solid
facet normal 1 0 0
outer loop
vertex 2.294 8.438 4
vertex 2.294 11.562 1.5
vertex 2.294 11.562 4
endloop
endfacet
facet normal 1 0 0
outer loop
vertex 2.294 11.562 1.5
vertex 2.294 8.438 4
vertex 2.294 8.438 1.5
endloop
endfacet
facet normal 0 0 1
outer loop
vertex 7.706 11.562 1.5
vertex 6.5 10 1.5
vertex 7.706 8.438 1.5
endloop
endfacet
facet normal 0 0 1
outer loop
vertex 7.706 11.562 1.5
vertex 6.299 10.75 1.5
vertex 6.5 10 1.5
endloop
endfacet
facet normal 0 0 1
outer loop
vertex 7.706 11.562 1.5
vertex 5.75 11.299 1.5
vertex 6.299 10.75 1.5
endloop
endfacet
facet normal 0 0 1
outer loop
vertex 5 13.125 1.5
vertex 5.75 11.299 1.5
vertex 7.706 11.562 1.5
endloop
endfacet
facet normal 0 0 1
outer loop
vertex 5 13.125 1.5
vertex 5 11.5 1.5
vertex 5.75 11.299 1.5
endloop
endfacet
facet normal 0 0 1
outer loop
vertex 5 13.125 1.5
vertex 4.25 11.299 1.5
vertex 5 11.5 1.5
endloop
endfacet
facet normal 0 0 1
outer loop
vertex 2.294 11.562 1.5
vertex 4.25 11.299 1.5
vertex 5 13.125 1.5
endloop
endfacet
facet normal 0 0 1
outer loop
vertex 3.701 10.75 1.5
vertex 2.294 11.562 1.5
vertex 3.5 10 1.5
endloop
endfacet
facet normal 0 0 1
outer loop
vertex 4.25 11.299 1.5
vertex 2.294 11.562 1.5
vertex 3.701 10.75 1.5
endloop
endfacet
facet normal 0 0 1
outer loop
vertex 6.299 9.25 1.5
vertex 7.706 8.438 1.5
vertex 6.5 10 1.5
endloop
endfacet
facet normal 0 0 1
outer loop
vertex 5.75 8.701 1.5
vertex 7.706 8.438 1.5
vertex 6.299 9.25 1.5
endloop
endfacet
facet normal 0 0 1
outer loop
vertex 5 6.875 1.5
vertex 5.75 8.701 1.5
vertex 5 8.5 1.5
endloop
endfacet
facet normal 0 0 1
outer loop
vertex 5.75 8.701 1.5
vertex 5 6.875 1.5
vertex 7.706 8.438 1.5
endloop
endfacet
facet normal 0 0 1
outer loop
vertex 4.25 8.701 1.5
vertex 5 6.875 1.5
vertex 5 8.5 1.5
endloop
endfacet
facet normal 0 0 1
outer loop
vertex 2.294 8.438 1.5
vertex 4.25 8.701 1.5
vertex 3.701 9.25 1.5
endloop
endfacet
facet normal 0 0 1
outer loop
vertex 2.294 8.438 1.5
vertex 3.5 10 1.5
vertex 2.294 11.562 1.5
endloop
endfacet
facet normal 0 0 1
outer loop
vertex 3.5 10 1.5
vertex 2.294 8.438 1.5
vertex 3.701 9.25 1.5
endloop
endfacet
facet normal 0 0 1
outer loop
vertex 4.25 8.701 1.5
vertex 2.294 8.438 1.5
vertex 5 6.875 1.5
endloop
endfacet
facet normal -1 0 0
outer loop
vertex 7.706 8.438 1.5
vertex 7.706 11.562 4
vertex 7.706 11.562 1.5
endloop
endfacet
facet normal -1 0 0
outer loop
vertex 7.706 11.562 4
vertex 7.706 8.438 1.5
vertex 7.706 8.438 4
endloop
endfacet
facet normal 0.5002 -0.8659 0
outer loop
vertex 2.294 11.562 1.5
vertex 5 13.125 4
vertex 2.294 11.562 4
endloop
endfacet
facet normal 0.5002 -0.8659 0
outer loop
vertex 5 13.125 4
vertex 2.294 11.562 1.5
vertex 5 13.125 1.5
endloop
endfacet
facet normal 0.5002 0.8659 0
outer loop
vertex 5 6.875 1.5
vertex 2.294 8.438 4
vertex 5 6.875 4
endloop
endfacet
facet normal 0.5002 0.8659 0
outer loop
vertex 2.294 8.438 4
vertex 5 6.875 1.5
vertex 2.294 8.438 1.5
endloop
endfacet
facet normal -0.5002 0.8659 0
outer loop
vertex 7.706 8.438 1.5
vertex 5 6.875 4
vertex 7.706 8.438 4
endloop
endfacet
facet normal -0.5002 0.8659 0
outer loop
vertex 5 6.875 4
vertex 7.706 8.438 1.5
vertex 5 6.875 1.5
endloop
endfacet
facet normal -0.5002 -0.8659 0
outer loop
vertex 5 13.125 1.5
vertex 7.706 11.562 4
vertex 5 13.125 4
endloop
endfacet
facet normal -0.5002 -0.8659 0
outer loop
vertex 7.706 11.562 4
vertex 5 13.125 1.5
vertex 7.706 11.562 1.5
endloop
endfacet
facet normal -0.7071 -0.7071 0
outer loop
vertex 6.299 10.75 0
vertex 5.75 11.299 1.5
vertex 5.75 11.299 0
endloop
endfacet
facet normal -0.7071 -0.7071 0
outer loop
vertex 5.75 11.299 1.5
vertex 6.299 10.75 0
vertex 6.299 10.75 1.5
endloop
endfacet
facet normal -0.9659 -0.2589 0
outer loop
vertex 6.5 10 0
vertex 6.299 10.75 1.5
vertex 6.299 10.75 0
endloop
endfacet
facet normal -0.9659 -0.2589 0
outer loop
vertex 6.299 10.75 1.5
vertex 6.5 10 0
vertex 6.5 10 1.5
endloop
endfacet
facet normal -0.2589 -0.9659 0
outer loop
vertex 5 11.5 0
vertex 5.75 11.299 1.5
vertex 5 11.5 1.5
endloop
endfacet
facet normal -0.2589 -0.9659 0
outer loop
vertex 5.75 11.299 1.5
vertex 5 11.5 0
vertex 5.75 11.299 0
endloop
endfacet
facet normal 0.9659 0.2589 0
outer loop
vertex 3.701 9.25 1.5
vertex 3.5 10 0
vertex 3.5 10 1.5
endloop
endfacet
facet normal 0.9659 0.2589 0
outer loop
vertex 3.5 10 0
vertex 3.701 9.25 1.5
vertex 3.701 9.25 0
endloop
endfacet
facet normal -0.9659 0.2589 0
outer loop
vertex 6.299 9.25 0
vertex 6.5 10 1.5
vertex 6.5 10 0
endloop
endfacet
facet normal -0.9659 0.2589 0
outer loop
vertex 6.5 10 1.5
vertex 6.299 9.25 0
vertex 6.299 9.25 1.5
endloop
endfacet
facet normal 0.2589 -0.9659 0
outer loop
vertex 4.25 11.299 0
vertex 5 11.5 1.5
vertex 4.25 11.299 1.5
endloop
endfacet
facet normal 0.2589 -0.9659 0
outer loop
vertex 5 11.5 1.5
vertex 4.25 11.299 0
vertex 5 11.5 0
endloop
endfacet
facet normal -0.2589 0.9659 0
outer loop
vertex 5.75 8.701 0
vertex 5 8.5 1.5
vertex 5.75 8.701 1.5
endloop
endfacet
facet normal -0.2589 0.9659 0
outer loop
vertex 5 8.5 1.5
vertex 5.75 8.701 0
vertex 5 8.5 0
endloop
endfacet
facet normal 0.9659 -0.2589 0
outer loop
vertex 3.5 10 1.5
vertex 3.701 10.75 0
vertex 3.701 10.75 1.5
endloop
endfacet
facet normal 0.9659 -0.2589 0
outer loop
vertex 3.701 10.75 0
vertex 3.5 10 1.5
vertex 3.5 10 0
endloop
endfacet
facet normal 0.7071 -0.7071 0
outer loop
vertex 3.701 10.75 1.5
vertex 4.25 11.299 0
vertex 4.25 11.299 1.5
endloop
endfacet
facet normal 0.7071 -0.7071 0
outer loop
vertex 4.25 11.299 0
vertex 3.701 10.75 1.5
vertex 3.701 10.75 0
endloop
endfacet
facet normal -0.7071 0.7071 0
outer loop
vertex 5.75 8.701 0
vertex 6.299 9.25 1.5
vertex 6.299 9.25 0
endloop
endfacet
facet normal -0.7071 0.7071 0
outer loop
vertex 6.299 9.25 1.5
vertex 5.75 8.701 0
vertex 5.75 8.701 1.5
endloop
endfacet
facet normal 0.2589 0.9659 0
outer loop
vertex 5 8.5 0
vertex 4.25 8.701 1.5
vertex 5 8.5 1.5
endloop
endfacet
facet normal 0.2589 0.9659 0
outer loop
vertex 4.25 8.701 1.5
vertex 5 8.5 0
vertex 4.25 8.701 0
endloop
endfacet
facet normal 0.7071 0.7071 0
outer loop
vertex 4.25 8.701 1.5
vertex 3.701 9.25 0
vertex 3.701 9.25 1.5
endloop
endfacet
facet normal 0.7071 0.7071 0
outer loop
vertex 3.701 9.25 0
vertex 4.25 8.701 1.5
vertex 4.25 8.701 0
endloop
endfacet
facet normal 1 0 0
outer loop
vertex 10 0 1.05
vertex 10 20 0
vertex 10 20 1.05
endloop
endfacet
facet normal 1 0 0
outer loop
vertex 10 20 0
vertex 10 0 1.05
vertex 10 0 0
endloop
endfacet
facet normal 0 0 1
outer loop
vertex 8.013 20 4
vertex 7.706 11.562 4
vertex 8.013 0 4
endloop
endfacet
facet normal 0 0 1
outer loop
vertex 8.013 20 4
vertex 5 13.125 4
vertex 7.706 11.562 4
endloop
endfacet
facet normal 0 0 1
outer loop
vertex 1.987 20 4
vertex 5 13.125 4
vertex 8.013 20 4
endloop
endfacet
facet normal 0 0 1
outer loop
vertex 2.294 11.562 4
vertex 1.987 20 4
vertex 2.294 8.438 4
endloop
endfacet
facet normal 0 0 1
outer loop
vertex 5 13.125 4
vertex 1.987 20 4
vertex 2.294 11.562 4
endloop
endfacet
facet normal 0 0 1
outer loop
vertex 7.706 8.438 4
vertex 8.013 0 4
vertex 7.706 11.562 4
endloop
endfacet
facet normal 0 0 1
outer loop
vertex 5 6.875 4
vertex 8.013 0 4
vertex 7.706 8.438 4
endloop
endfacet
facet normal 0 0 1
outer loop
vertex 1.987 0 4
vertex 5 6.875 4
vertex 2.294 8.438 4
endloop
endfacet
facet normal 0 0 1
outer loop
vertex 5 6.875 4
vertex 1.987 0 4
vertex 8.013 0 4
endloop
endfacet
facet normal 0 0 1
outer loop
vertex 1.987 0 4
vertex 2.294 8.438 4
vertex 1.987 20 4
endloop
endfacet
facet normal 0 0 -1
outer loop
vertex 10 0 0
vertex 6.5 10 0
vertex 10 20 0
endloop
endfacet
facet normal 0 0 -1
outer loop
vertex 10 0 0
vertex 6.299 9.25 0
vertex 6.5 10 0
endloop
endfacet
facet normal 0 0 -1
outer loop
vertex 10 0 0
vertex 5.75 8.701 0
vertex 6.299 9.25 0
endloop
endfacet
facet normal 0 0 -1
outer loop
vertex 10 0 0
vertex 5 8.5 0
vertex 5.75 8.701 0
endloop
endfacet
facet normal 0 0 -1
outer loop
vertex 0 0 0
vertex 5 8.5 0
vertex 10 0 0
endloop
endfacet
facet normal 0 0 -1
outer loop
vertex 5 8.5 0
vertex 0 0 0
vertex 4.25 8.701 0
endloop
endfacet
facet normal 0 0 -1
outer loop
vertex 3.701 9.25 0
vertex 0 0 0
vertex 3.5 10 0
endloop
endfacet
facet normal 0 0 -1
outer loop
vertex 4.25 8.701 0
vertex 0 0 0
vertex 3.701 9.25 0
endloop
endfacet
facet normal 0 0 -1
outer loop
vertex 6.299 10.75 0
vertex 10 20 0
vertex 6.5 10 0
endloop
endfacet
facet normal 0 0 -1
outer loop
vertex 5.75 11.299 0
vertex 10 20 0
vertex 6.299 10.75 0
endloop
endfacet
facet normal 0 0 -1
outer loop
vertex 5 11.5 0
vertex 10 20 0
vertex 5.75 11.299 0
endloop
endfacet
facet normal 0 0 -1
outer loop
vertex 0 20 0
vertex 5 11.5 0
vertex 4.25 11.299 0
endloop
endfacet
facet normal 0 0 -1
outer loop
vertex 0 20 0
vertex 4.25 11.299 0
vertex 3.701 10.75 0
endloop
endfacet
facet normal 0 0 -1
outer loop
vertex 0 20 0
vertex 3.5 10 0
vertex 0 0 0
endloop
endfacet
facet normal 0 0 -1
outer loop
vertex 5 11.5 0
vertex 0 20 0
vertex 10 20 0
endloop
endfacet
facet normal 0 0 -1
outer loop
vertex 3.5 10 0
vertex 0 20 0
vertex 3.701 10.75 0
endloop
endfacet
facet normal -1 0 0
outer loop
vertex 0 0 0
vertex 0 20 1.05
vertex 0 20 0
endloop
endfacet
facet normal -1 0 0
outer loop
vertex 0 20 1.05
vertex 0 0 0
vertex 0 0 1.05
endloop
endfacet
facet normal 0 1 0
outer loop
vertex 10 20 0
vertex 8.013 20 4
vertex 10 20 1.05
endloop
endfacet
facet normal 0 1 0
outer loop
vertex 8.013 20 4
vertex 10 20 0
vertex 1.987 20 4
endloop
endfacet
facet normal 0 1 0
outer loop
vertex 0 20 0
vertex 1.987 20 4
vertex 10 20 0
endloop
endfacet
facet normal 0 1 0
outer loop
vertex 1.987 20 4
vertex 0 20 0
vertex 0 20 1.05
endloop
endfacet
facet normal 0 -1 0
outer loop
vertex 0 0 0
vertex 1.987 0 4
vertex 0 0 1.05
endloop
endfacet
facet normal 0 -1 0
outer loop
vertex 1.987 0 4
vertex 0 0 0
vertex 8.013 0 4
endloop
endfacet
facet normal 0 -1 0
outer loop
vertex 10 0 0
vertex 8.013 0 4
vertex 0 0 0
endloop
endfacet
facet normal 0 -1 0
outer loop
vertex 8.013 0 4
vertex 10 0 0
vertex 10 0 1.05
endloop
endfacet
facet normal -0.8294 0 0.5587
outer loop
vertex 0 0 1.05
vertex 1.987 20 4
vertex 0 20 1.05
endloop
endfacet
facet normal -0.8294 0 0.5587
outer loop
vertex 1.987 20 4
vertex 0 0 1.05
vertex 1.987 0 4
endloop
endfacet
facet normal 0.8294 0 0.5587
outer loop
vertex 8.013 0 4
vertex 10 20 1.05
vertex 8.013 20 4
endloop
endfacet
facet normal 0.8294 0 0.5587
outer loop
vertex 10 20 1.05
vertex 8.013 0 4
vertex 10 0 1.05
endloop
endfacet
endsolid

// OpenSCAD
// Customizer Parameters

// Create a T-nut for v-slot style extrusions. Defaults for 2020 extrusion with M3 hole.
//
// Arguments:
// length of tnut
length=20;

// how many holes to put in it
holes=1;

// diameter of holes
holesize=3;

// distance between hole centers (which are always centered on the nut)
spacing=10;

// depth of nut sink
sink=2.5;

// height of tnut (use 4mm for 2020 extrusion)
height=4;

// width of tnut (use 10mm for 2020 extrusion)
width=10;

// inset distance of bezel (use 3mm for 2020 extrusion)
bezel=2;

// depth of base (negative from z=0); use for slide-on attachments to other parts)
base=0;

// nut parameters
// how many sides on the nut (hex=6)
nutsides=6;
// nutsize = point-to-point size of nut
nutsize=6.25;
// amount to rotate (to fit inside body)
nutrotation=30;

// circle optimization
$fn=12;

// include <mygeom.scad>
module rotate_axis(axis, d) {
    rotate(list_for_axis(axis, d)) children();
}

module xrotate(d) {
    rotate_axis("x", d) children();
}

module yrotate(d) {
    rotate_axis("y", d) children();
}

module zrotate(d) {
    rotate_axis("z", d) children();
}

function list_for_axis(axis, d) =
(
    axis=="x" ? [d, 0, 0] : (
        axis=="y" ? [0, d, 0] : (
            axis=="z" ? [0, 0, d] : [0, 0, 0]))
);

module translate_axis(axis, d) {
    translate(list_for_axis(axis, d)) children();
}

module xmove(d) {
    translate_axis("x", d) children();
}

module ymove(d) {
    translate_axis("y", d) children();
}

module zmove(d) {
    translate_axis("z", d) children();
}

module spread_axis(axis, d, n=1) {
    x = d/2;
    if(d==0 || n==0) {
        children();
    }
    else
    {
        for(i=[-x:(d/n):x]) {
            translate_axis(axis, i) children();
        }
    } 
}

module xspread(d, n=1)
{
    spread_axis("x", d, n) children();
}

module yspread(d, n=1)
{
    spread_axis("y", d, n) children();
}


module zspread(d, n=1)
{
    spread_axis("z", d, n) children();
}

module star(points, id, od)
{
    polygon([
        for(i=[0:points*2])
            [
            (i%2==0) ? cos(i*(360/(points*2)))*od/2 : cos(i*(360/(points*2)))*id/2,
            (i%2==0) ? sin(i*(360/(points*2)))*od/2 : sin(i*(360/(points*2)))*id/2
            ]
    ]);
}

module unit_star(points, height, id, od, center=true)
{
    linear_extrude(height, center=center) star(points, id, od);
}

module unit_polygon(r, n)
{
    polygon([
        for(i=[0:360/n:360])
            [ cos(i)*r, sin(i)*r ]
    ]);
}


module screw_hole(size, depth, sinkwidth=5, sinkdepth=0, type="round", center=true) {
    zmove(center ? 0 : depth/2) {
        cylinder(h=depth, d=size, $fn=12, center=true);
        ref=sinkdepth/abs(sinkdepth) * depth/2;
        zmove(ref-sinkdepth/2) {
            if(type=="round") cylinder(h=abs(sinkdepth), d=sinkwidth, $fn=12, center=true);
            if(type=="hex") linear_extrude(height=abs(sinkdepth), center=true) rotate([0, 0, 30]) unit_polygon(sinkwidth/2, 6);
        }
    }
}

module rounded_cube(size, diameter, center=false) {
    hull() {
        xmove((size[0])/2) xspread(size[0]-diameter) ymove((size[1])/2) yspread(size[1]-diameter) cylinder(d=diameter, h=size[2], center=center);
    }
}

module round_chamfer() {
    intersection() {
        cylinder(d=4, h=11, $fn=20);
        cube(size=[2, 2, 11]);
    }
}


// tnut.scad
module tnut(l) {
    difference() {
        union() {
            // nut block
            cube([width, l, height]);
            // base
            zmove(-base) xmove(bezel) cube([width-2*bezel, l, base]);
        }
        // bezels
        ymove(-0.02) rotate([-90, 0, 0]) linear_extrude(height=l+0.04) polygon([ [-0.02, -height/4-0.02], [bezel, -height-0.02], [-0.02, -height-0.02] ]);
        ymove(-0.02) rotate([-90, 0, 0]) linear_extrude(height=l+0.04) polygon([ [width+0.02, -height/4-0.02], [width-bezel, -height-0.02], [width+0.02, -height-0.02] ]);
        // hole and countersink
        ymove(l/2) yspread((holes-1)*spacing, holes-1) xmove(width/2) {
            zmove(height-sink) linear_extrude(height=sink+0.02) rotate([0, 0, nutrotation]) unit_polygon(nutsize/2, nutsides);
            zmove(-base-0.02) cylinder(d=holesize, h=height+base+0.02);
        }
    }
}

// Examples
//tnut(40, holes=4, spacing=10); // 4-hole 40mm

//tnut(40, holes=2, spacing=20); // 2-hole 40mm
//xmove(20) tnut(10); // 1-hole 20mm

//xmove(20) tnut(10); // 1-hole 10mm

//xmove(40) tnut(40, holes=3, spacing=10, base=3); // 3-holes 10mm apart with a 3mm base

// square nut with 6mm diagonal
//xmove(-20) tnut(20, holes=2, spacing=10, nutsides=4, nutrotation=45, nutsize=6);

// Customizer
tnut(length);
